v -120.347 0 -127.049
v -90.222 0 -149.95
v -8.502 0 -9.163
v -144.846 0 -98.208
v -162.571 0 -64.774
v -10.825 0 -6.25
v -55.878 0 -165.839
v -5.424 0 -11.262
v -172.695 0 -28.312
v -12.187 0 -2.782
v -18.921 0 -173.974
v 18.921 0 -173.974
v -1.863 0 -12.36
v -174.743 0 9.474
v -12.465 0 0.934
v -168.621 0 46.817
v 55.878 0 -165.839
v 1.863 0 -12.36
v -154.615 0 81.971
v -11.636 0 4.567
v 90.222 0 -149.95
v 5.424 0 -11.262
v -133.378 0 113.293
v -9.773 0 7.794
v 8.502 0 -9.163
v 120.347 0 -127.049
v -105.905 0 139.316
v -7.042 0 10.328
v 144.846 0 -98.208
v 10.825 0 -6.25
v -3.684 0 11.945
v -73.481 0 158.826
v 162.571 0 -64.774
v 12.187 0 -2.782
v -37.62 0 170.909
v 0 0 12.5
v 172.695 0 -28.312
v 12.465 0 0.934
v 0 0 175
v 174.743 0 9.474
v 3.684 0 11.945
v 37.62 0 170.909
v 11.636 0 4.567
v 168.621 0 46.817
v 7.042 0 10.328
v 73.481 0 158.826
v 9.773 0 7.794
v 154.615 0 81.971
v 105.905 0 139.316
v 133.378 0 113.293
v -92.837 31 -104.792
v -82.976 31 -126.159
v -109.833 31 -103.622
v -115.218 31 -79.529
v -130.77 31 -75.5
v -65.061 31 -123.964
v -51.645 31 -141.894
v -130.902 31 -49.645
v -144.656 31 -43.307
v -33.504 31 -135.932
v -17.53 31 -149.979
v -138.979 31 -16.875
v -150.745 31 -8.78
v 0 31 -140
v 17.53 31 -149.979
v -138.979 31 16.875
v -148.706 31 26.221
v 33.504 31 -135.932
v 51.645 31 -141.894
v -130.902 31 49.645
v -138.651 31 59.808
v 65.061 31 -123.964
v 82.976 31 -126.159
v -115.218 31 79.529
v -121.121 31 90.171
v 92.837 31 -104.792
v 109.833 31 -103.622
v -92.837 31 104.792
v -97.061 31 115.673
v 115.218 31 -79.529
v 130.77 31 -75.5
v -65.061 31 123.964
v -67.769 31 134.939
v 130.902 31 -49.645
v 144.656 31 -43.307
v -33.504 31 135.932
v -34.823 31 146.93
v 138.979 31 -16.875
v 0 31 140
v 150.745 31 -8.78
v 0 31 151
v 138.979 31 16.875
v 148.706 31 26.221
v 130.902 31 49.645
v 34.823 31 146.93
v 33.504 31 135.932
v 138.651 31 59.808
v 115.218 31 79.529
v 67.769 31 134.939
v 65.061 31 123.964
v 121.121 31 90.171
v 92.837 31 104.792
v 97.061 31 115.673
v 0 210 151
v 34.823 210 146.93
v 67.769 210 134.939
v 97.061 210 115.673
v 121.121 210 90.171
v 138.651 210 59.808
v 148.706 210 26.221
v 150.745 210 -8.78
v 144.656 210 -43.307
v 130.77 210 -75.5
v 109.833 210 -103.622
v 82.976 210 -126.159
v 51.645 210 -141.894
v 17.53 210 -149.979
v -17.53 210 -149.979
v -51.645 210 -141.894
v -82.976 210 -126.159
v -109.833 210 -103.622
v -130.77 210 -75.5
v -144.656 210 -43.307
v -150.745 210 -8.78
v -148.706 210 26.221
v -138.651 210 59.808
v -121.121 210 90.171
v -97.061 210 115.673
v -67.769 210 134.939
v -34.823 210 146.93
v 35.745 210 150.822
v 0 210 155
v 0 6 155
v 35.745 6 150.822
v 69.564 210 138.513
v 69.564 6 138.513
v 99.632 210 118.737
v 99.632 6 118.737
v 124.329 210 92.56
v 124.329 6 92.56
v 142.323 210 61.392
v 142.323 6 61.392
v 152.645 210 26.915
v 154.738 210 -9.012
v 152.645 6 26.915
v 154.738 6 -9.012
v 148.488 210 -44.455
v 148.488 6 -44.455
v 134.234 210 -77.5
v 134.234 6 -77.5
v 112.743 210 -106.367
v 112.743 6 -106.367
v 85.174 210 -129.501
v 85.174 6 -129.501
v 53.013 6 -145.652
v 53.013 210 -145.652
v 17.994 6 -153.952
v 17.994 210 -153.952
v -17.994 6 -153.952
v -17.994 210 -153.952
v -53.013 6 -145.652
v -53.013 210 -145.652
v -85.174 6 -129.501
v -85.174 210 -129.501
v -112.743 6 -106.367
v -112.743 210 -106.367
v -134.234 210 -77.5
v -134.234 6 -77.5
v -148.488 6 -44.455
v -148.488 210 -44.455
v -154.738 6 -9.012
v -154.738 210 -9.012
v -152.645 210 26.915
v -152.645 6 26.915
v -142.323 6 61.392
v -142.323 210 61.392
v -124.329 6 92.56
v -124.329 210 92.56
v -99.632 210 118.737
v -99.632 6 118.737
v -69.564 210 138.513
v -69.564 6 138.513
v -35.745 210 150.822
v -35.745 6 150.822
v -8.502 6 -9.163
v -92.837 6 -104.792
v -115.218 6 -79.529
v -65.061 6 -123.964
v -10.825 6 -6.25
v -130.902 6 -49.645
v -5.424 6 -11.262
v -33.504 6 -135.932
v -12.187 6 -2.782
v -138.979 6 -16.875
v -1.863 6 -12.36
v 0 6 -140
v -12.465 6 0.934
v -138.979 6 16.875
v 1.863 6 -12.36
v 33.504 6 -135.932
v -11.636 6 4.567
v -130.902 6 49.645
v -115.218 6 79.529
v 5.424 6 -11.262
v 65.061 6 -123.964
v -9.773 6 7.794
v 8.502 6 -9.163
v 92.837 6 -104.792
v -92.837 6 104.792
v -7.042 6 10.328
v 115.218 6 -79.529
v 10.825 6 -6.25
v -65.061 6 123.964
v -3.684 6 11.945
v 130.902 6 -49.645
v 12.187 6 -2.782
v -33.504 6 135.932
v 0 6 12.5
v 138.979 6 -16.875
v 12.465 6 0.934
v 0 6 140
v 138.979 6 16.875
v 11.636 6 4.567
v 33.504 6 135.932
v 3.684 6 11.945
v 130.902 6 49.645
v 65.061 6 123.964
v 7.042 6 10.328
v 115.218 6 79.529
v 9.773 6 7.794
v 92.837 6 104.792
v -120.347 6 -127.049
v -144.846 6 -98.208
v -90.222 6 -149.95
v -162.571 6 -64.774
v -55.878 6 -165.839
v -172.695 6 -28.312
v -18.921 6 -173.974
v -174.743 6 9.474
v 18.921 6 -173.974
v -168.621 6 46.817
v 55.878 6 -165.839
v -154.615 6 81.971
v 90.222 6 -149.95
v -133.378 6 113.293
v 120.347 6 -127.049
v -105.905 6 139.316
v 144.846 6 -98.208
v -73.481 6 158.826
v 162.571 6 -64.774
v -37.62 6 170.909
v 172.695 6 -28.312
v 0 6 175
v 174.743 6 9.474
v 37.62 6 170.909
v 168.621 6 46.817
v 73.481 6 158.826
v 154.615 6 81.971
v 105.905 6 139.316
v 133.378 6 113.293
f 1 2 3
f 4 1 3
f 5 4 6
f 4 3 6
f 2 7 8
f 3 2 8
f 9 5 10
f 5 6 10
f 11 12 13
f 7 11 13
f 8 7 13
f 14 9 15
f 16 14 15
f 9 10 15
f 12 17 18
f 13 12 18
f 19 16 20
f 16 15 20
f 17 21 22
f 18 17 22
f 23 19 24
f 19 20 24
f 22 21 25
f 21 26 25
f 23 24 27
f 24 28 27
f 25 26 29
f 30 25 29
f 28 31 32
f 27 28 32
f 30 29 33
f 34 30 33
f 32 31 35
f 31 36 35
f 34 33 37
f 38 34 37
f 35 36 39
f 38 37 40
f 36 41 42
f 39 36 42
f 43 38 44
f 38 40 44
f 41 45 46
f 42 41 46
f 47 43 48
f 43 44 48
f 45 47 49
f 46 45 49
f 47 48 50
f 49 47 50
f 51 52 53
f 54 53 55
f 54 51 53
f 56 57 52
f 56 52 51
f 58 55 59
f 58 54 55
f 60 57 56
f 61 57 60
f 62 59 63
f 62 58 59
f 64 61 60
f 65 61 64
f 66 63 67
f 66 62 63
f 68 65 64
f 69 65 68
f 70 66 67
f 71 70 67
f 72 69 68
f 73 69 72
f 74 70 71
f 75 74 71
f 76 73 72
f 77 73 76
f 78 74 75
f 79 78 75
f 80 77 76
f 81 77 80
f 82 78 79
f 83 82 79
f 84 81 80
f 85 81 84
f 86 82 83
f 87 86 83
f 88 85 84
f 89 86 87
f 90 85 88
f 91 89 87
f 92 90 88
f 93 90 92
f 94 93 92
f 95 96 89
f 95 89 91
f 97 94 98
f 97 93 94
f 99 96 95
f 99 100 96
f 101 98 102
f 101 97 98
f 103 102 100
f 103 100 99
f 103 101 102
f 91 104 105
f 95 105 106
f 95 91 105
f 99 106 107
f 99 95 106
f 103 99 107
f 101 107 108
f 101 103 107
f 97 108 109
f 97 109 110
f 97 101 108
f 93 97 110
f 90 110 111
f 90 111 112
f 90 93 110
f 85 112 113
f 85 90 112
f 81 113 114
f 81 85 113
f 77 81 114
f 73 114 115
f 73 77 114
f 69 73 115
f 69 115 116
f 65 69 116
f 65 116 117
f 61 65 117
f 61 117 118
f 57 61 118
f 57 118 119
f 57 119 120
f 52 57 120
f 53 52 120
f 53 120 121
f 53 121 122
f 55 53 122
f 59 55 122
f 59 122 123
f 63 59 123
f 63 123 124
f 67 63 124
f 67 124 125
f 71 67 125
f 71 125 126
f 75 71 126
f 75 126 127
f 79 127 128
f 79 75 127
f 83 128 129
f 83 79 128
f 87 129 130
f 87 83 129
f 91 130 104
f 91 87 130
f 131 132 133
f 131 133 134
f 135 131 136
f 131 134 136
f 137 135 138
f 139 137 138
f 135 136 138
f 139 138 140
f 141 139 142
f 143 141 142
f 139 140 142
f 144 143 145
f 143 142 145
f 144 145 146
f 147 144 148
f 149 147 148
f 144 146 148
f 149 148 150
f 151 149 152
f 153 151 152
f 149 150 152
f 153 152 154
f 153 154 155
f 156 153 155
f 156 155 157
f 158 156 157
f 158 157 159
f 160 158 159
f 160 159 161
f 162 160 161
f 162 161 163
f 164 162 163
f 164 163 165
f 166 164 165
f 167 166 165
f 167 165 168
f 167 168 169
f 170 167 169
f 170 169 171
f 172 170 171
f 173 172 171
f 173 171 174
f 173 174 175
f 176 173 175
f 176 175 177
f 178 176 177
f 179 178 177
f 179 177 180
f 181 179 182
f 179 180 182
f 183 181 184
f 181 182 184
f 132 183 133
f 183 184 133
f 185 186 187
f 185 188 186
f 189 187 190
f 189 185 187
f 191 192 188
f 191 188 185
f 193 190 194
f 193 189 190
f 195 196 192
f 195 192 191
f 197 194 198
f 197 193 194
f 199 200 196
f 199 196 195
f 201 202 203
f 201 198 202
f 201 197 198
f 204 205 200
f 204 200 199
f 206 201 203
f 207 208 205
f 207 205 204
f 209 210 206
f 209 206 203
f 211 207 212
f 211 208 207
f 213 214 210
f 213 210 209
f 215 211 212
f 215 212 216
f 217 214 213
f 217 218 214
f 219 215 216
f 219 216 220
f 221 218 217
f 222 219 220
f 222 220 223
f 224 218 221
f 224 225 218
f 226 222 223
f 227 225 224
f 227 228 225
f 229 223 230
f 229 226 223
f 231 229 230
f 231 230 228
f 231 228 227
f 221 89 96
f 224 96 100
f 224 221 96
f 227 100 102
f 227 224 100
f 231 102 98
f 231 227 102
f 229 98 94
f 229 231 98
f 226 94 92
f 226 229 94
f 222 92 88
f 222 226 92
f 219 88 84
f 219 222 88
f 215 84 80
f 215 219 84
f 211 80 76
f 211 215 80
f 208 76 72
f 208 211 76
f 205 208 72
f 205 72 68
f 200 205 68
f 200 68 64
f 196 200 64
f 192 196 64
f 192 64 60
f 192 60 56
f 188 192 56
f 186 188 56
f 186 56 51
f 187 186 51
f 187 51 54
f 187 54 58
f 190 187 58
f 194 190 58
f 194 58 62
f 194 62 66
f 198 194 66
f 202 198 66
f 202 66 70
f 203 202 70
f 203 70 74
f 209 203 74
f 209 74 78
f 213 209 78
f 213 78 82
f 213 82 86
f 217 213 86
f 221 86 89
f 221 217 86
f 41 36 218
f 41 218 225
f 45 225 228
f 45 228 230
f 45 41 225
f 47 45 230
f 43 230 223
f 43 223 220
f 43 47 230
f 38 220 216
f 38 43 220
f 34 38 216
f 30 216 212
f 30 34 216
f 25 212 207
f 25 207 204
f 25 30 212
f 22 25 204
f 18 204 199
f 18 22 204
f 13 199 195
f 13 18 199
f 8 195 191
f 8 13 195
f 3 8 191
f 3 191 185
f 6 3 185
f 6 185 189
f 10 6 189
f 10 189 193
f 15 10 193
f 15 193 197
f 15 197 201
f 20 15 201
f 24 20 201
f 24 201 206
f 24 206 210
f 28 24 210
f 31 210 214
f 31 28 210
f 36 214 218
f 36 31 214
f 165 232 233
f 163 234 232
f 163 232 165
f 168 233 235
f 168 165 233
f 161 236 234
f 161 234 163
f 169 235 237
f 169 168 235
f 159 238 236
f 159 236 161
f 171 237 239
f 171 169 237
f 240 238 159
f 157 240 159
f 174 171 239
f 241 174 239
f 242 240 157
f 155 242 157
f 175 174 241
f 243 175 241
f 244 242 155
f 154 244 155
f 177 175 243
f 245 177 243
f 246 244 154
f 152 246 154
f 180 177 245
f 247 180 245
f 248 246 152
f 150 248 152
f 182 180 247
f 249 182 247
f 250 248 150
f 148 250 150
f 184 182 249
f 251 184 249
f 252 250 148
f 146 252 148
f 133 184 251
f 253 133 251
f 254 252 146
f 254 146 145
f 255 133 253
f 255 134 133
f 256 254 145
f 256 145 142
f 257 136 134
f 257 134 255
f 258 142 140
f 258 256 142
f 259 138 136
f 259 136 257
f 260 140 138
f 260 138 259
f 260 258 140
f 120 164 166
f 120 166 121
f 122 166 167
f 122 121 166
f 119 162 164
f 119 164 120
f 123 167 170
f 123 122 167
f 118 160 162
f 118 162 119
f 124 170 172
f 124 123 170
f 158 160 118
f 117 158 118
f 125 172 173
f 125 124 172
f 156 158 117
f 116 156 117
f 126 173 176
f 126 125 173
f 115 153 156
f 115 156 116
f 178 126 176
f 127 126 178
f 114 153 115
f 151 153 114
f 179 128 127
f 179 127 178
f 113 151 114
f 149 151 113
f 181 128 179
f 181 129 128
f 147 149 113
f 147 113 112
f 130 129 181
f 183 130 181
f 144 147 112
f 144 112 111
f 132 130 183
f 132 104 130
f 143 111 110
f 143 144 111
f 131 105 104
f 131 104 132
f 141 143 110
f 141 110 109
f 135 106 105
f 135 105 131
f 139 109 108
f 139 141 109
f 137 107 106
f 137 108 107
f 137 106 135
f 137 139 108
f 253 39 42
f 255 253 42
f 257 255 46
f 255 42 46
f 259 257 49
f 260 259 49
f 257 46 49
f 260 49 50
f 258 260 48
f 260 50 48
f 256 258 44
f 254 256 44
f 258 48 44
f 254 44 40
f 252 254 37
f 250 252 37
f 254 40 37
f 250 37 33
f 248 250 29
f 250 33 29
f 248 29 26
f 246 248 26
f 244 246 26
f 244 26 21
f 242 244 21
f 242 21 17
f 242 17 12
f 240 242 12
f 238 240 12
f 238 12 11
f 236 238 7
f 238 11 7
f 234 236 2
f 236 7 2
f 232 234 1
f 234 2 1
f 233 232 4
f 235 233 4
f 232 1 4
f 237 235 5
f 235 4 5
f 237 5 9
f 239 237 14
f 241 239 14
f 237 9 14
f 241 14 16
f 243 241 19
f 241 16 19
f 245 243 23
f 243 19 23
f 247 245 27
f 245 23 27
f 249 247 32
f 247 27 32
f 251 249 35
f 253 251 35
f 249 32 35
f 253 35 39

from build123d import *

# Parameters (mm, degrees)
FLOOR_SKETCH_R          = 175
FLOOR_SKETCH_R_2        = 12.5
FLOOR_TANK_LID_DEPTH    = 6
BASKET_LEDGE_SKETCH_R   = 152
BASKET_LEDGE_SKETCH_R_2 = 140
BASKET_LEDGE_DEPTH      = 31
HOUSING_WALL_SKETCH_R   = 155
HOUSING_WALL_SKETCH_R_2 = 151
HOUSING_WALL_DEPTH      = 210


with BuildPart() as part:
    # Floor Sketch → Floor - Tank Lid (new body)
    with BuildSketch(Plane(origin=(0, 0, 0), x_dir=(1, 0, 0), z_dir=(0, 1, 0))):
        with Locations(Location((0, 0, 0), (0, 0, 270))):
            Circle(FLOOR_SKETCH_R)
        with Locations(Location((0, 0, 0), (0, 0, 270))):
            Circle(FLOOR_SKETCH_R_2, mode=Mode.SUBTRACT)
    extrude(amount=FLOOR_TANK_LID_DEPTH)

    # Basket Ledge Sketch → Basket Ledge (add)
    with BuildSketch(Plane(origin=(0, 0, 0), x_dir=(1, 0, 0), z_dir=(0, 1, 0))):
        with Locations(Location((0, 0, 0), (0, 0, 270))):
            Circle(BASKET_LEDGE_SKETCH_R)
        with Locations(Location((0, 0, 0), (0, 0, 270))):
            Circle(BASKET_LEDGE_SKETCH_R_2, mode=Mode.SUBTRACT)
    extrude(amount=BASKET_LEDGE_DEPTH)

    # Housing Wall Sketch → Housing Wall (add)
    with BuildSketch(Plane(origin=(0, 0, 0), x_dir=(1, 0, 0), z_dir=(0, 1, 0))):
        with Locations(Location((0, 0, 0), (0, 0, 270))):
            Circle(HOUSING_WALL_SKETCH_R)
        with Locations(Location((0, 0, 0), (0, 0, 270))):
            Circle(HOUSING_WALL_SKETCH_R_2, mode=Mode.SUBTRACT)
    extrude(amount=HOUSING_WALL_DEPTH)


solid = part.part
